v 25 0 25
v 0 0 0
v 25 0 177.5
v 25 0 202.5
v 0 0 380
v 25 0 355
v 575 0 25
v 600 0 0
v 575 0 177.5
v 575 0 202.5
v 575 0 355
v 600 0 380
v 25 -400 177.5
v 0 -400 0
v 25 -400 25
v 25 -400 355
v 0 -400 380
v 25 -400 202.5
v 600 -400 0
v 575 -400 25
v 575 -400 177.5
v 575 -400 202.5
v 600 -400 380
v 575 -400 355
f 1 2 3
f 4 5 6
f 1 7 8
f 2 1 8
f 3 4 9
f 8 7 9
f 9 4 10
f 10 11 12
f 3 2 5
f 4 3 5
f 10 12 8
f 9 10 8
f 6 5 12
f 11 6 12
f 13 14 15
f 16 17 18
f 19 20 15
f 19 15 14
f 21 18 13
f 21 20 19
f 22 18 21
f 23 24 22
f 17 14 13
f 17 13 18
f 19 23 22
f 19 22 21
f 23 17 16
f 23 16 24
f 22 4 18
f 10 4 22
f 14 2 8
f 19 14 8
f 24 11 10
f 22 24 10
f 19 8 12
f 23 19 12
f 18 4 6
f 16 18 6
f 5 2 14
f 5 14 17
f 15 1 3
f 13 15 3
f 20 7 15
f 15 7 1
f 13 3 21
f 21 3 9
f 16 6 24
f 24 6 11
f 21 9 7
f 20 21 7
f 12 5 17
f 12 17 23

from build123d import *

# Parameters (mm, degrees)
F0_W     = 600
F0_H     = 380
F0_W_2   = 550
F0_H_2   = 152.5
F0_H_3   = 25
F1_DEPTH = 50
F2_DEPTH = 400
F3_DEPTH = 50.001
F4_DEPTH = 400


with BuildPart() as f1:
    # F0 (on Front) → F1 (new body)
    with BuildSketch(Plane.XZ):
        with Locations((300, 190)):
            Rectangle(F0_W, F0_H)
        Polygon((25, 202.5), (25, 355), (575, 355), (575, 202.5), (575, 177.5), (575, 25), (25, 25), (25, 177.5), align=None, mode=Mode.SUBTRACT)
        with Locations((300, 278.75)):
            Rectangle(F0_W_2, F0_H_2)
        with Locations((300, 190)):
            Rectangle(F0_W_2, F0_H_3)
        with Locations((300, 101.25)):
            Rectangle(F0_W_2, F0_H_2)
    extrude(amount=F1_DEPTH)

    # F0 (on Front) → F2 (join)
    with BuildSketch(Plane.XZ):
        with Locations((300, 190)):
            Rectangle(F0_W, F0_H)
        Polygon((25, 202.5), (25, 355), (575, 355), (575, 202.5), (575, 177.5), (575, 25), (25, 25), (25, 177.5), align=None, mode=Mode.SUBTRACT)
    extrude(amount=F2_DEPTH)

    # F3 (cut, through all): a face of the model
    f3_faces = [f1.faces().sort_by_distance(p)[0] for p in [
        (300, -50, 190),
    ]]
    extrude(f3_faces, amount=-F3_DEPTH, mode=Mode.SUBTRACT)

    # F0 (on Front) → F4 (join, through all)
    with BuildSketch(Plane.XZ):
        with Locations((300, 190)):
            Rectangle(F0_W_2, F0_H_3)
    extrude(amount=F4_DEPTH)


solid = f1.part
